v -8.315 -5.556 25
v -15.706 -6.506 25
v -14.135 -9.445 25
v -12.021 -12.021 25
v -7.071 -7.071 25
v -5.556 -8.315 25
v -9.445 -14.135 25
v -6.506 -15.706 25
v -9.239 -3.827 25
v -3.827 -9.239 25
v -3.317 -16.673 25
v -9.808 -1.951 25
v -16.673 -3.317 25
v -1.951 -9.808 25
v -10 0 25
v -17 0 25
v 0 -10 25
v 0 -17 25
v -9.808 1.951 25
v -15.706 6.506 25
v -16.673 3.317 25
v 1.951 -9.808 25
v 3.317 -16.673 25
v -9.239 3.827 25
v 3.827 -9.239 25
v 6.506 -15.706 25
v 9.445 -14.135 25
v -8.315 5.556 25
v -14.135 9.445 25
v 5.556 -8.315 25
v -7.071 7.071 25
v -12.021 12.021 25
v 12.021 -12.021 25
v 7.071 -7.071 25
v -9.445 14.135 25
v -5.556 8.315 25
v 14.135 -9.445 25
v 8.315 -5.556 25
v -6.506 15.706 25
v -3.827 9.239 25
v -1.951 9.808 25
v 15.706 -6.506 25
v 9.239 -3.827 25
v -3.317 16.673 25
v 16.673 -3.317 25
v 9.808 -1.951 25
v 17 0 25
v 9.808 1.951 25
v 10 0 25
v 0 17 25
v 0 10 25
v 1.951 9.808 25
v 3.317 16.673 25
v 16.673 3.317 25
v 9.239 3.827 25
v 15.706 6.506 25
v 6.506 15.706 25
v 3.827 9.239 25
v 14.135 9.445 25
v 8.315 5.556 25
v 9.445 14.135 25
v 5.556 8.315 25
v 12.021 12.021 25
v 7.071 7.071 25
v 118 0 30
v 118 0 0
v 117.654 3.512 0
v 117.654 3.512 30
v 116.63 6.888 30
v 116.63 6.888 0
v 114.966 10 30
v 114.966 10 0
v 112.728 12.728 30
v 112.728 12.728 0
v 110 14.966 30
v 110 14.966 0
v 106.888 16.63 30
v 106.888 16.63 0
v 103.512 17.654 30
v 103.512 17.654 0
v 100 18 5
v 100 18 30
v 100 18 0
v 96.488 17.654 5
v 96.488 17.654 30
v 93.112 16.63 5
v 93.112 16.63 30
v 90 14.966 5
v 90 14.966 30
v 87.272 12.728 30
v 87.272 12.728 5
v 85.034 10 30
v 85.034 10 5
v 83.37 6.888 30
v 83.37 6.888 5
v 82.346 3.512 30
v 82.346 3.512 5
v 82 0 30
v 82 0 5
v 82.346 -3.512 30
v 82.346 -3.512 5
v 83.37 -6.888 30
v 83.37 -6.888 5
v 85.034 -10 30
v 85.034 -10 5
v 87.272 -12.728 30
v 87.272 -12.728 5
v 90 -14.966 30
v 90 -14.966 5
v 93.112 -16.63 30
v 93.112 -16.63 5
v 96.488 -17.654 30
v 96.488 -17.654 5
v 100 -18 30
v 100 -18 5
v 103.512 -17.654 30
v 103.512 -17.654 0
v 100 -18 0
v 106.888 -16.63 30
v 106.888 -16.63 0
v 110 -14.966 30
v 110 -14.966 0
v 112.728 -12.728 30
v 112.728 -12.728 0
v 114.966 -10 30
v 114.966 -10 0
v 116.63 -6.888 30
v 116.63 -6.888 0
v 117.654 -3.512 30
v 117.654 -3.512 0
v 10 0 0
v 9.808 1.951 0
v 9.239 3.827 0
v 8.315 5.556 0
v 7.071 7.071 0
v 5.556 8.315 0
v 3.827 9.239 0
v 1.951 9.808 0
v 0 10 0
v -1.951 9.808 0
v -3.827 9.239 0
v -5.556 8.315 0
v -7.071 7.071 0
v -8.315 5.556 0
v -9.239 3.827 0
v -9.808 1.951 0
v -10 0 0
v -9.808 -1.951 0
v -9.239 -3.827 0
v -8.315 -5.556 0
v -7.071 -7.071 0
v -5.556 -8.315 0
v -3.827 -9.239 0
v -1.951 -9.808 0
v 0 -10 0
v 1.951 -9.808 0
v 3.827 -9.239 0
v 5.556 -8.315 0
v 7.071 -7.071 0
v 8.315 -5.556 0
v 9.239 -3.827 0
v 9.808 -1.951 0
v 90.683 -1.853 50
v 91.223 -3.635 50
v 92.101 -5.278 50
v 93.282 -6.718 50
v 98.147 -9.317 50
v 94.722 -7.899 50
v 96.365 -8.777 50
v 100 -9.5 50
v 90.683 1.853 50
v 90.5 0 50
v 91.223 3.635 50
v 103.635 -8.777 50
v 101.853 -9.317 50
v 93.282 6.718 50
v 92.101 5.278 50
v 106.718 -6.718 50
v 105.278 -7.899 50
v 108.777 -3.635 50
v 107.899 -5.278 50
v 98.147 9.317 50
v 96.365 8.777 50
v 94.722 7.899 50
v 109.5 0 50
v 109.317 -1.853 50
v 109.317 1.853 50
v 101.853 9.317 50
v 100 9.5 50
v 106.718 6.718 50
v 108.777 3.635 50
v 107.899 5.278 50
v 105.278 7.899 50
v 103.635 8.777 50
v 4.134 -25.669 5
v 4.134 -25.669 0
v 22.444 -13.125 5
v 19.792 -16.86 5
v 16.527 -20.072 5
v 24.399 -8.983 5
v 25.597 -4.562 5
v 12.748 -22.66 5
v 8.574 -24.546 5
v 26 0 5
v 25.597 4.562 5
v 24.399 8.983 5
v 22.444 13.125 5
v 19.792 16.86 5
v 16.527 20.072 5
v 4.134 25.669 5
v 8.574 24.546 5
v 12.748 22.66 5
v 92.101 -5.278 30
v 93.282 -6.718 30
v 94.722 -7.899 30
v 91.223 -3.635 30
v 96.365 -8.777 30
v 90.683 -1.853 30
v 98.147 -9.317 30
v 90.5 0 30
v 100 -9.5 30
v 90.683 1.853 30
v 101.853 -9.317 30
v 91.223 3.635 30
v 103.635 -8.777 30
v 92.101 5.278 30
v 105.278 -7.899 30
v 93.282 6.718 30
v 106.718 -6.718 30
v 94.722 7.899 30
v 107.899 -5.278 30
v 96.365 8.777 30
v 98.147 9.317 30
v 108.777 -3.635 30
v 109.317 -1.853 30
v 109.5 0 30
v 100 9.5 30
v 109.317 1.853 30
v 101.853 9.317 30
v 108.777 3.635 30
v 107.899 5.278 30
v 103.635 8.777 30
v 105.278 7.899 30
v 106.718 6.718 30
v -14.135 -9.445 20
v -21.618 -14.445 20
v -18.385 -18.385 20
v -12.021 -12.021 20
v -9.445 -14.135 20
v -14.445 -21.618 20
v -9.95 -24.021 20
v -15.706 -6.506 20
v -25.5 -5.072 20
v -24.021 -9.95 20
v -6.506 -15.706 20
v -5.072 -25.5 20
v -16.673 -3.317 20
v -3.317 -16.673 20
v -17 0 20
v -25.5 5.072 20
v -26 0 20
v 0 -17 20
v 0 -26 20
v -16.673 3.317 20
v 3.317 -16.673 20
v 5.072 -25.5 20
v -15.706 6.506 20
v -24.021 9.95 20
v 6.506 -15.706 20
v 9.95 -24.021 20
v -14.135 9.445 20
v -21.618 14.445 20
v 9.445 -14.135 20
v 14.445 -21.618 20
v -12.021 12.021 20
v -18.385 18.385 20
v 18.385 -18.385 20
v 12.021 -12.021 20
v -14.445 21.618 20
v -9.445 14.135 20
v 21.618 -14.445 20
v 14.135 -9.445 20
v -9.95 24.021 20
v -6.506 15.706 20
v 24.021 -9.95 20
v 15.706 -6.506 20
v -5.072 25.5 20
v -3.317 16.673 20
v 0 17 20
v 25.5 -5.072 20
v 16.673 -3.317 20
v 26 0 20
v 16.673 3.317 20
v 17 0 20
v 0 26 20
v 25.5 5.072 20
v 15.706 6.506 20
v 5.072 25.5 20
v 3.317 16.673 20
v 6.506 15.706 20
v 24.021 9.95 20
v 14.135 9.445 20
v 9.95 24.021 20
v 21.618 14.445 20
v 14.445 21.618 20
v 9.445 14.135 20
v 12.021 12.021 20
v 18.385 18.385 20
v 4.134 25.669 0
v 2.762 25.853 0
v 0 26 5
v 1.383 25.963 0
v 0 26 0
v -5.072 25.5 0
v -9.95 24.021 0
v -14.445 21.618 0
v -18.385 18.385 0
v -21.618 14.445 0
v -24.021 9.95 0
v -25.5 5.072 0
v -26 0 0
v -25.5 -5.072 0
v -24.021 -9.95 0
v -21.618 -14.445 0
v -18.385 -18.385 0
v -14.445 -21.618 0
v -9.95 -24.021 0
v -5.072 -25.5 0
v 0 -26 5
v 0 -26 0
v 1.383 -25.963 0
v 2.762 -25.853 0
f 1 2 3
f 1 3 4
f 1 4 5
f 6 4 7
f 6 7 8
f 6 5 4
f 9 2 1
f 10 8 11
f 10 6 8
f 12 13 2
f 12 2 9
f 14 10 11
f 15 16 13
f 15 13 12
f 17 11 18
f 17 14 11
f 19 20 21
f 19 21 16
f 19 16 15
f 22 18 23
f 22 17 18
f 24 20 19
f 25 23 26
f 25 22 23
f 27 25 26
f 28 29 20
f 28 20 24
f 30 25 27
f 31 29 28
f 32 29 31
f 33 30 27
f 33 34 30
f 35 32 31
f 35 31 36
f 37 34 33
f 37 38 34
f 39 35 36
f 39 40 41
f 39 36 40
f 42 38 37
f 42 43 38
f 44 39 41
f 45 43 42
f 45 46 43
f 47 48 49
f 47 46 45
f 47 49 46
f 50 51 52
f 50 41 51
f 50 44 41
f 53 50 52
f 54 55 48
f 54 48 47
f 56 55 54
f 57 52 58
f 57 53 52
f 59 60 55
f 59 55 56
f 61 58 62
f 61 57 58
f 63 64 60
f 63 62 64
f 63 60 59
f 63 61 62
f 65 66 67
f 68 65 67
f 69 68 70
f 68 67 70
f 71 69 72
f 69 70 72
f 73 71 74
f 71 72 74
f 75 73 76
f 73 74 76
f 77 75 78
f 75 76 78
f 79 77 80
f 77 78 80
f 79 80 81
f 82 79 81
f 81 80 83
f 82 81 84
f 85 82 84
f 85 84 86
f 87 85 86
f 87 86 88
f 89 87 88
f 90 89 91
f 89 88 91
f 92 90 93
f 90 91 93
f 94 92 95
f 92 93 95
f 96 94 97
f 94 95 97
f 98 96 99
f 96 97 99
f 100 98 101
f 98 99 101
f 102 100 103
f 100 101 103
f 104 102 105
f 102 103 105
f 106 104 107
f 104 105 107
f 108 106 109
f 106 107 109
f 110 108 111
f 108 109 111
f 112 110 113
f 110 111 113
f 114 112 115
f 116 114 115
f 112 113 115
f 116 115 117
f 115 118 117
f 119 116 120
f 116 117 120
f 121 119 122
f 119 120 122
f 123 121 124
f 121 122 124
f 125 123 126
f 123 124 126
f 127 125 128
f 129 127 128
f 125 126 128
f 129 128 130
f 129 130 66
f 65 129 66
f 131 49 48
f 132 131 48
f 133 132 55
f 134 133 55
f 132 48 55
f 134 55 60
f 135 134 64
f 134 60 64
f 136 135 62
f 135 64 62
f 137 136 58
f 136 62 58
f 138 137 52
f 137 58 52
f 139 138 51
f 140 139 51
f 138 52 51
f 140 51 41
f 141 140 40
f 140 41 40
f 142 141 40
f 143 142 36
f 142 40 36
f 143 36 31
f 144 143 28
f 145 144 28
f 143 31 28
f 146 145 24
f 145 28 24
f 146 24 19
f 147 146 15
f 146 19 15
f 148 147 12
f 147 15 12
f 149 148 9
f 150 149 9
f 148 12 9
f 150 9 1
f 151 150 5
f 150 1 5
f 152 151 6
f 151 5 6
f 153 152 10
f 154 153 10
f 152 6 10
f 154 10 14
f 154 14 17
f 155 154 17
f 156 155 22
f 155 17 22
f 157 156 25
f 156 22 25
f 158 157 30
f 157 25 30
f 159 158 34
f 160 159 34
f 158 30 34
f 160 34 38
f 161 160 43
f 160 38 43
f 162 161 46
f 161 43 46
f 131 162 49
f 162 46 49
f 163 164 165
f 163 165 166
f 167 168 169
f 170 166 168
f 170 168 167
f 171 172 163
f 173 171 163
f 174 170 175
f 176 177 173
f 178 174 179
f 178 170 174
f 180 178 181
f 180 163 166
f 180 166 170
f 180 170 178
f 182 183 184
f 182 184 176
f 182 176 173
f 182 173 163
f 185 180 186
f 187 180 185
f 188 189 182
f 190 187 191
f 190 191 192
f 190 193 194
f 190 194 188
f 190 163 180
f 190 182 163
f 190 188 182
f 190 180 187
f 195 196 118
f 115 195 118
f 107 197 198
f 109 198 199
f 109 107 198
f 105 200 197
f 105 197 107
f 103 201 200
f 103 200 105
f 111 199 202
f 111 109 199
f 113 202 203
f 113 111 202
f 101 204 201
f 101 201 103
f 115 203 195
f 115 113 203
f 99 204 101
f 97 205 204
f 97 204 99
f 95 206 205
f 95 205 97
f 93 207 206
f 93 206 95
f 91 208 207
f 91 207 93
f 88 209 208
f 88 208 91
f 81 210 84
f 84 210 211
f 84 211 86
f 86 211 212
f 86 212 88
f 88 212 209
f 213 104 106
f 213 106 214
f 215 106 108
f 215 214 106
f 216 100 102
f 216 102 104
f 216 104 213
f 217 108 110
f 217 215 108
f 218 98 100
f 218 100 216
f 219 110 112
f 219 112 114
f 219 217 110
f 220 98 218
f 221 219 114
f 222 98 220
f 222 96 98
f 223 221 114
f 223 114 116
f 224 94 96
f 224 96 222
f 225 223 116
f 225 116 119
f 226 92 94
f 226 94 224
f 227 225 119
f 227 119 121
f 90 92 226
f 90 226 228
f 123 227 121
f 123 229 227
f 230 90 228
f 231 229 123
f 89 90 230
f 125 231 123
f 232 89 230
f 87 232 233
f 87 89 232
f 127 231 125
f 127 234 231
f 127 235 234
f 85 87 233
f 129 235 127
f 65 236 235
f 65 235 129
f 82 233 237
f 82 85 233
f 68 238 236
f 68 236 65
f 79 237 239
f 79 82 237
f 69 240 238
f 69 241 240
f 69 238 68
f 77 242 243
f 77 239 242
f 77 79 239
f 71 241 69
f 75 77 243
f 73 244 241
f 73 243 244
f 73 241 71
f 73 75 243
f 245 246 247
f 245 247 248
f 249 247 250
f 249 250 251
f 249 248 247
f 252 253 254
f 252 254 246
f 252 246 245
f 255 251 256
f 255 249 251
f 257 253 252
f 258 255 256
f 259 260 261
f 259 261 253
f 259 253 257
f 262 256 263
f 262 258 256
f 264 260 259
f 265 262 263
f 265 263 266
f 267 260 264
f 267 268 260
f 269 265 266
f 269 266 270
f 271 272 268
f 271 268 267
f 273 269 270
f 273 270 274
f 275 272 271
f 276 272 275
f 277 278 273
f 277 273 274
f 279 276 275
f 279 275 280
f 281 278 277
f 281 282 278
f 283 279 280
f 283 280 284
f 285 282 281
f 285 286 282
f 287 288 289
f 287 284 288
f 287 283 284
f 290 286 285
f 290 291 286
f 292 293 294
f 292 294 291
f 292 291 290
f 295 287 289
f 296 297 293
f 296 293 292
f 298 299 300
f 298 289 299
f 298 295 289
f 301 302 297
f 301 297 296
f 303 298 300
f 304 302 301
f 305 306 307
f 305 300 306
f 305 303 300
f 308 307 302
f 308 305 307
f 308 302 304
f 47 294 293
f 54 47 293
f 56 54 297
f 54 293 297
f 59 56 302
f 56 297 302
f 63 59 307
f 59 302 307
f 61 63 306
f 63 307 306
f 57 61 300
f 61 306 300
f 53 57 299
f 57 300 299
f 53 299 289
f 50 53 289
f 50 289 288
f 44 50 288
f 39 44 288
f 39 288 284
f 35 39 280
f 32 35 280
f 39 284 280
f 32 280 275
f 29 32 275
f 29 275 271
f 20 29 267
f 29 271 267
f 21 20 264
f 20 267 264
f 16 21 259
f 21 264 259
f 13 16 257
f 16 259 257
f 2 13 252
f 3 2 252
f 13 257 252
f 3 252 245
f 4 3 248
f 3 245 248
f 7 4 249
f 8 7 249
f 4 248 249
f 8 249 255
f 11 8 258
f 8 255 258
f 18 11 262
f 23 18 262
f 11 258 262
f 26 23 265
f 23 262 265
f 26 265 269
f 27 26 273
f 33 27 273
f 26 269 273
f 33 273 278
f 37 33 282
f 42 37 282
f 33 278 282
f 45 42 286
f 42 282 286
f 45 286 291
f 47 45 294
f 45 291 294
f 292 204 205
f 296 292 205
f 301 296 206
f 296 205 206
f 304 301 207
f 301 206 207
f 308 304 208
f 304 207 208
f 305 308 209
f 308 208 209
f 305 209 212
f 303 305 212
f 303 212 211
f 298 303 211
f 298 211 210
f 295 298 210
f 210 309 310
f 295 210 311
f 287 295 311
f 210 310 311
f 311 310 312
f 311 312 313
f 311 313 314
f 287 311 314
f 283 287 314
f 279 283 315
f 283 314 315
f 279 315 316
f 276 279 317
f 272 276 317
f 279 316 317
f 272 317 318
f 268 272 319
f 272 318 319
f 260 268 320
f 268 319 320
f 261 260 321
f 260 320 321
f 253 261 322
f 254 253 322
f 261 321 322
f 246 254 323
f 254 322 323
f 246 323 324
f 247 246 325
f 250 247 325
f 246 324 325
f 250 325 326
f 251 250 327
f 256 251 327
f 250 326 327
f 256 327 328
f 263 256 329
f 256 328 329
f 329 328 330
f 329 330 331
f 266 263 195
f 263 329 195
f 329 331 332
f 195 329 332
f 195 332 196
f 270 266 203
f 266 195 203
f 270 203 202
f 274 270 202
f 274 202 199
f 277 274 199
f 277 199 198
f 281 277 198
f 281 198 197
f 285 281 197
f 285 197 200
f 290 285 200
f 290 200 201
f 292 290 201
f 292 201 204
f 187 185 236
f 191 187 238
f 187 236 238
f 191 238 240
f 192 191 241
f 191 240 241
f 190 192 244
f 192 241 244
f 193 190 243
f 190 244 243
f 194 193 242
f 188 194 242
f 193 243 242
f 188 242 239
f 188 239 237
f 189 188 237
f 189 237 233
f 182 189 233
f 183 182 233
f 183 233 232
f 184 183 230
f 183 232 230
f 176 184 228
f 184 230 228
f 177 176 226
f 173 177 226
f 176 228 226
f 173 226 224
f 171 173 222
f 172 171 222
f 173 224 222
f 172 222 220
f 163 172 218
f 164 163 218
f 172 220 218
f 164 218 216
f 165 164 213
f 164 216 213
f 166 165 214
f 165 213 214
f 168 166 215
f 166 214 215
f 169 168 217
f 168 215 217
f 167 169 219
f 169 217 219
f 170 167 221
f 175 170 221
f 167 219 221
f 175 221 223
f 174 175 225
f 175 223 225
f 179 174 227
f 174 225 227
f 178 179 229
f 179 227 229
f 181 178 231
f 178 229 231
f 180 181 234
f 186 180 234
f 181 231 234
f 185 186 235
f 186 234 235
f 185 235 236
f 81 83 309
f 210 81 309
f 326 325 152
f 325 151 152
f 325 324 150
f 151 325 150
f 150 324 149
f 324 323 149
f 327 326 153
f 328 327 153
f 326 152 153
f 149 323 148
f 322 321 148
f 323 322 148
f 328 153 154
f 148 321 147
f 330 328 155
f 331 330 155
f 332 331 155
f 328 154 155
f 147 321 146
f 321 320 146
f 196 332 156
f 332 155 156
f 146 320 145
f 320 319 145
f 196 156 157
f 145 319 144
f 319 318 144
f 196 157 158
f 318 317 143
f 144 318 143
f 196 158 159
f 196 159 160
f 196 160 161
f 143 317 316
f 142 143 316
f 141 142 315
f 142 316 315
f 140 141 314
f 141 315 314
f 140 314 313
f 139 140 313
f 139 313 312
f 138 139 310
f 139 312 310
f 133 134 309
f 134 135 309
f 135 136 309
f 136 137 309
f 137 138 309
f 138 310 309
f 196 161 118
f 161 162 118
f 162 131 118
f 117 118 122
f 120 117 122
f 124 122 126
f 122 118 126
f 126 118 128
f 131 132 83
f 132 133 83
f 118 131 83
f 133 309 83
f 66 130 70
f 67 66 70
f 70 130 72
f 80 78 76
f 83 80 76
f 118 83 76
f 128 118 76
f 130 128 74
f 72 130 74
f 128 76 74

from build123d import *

# Parameters (mm, degrees)
F0_R      = 26
F3_DEPTH  = 20
F4_DEPTH  = 5
F2_R      = 18
F5_DEPTH  = 30
F6_R      = 17
F8_DEPTH  = 5
F7_R      = 9.5
F9_DEPTH  = 20
F10_R     = 10
F11_DEPTH = 25


with BuildPart() as f3:
    # F0 (on Top) → F3 (new body)
    with BuildSketch(Plane.XY):
        Circle(F0_R)
    extrude(amount=F3_DEPTH)

    # F1 (on Top) → F4 (join)
    with BuildSketch(Plane.XY):
        Polygon((100, 18), (0, 26), (0, -26), (100, -18), align=None)
    extrude(amount=F4_DEPTH)

    # F2 (on Top) → F5 (join)
    with BuildSketch(Plane.XY):
        with Locations((100, 0)):
            Circle(F2_R)
    extrude(amount=F5_DEPTH)

    # F6 (on face) → F8 (join)
    with BuildSketch(Plane.XY.offset(20)):
        Circle(F6_R)
    extrude(amount=F8_DEPTH)

    # F7 (on face) → F9 (join)
    with BuildSketch(Plane.XY.offset(30)):
        with Locations((100, 0)):
            Circle(F7_R)
    extrude(amount=F9_DEPTH)

    # F10 (on face) → F11 (cut, through all)
    with BuildSketch(Plane.XY.offset(25)):
        Circle(F10_R)
    extrude(amount=-F11_DEPTH, mode=Mode.SUBTRACT)


solid = f3.part
